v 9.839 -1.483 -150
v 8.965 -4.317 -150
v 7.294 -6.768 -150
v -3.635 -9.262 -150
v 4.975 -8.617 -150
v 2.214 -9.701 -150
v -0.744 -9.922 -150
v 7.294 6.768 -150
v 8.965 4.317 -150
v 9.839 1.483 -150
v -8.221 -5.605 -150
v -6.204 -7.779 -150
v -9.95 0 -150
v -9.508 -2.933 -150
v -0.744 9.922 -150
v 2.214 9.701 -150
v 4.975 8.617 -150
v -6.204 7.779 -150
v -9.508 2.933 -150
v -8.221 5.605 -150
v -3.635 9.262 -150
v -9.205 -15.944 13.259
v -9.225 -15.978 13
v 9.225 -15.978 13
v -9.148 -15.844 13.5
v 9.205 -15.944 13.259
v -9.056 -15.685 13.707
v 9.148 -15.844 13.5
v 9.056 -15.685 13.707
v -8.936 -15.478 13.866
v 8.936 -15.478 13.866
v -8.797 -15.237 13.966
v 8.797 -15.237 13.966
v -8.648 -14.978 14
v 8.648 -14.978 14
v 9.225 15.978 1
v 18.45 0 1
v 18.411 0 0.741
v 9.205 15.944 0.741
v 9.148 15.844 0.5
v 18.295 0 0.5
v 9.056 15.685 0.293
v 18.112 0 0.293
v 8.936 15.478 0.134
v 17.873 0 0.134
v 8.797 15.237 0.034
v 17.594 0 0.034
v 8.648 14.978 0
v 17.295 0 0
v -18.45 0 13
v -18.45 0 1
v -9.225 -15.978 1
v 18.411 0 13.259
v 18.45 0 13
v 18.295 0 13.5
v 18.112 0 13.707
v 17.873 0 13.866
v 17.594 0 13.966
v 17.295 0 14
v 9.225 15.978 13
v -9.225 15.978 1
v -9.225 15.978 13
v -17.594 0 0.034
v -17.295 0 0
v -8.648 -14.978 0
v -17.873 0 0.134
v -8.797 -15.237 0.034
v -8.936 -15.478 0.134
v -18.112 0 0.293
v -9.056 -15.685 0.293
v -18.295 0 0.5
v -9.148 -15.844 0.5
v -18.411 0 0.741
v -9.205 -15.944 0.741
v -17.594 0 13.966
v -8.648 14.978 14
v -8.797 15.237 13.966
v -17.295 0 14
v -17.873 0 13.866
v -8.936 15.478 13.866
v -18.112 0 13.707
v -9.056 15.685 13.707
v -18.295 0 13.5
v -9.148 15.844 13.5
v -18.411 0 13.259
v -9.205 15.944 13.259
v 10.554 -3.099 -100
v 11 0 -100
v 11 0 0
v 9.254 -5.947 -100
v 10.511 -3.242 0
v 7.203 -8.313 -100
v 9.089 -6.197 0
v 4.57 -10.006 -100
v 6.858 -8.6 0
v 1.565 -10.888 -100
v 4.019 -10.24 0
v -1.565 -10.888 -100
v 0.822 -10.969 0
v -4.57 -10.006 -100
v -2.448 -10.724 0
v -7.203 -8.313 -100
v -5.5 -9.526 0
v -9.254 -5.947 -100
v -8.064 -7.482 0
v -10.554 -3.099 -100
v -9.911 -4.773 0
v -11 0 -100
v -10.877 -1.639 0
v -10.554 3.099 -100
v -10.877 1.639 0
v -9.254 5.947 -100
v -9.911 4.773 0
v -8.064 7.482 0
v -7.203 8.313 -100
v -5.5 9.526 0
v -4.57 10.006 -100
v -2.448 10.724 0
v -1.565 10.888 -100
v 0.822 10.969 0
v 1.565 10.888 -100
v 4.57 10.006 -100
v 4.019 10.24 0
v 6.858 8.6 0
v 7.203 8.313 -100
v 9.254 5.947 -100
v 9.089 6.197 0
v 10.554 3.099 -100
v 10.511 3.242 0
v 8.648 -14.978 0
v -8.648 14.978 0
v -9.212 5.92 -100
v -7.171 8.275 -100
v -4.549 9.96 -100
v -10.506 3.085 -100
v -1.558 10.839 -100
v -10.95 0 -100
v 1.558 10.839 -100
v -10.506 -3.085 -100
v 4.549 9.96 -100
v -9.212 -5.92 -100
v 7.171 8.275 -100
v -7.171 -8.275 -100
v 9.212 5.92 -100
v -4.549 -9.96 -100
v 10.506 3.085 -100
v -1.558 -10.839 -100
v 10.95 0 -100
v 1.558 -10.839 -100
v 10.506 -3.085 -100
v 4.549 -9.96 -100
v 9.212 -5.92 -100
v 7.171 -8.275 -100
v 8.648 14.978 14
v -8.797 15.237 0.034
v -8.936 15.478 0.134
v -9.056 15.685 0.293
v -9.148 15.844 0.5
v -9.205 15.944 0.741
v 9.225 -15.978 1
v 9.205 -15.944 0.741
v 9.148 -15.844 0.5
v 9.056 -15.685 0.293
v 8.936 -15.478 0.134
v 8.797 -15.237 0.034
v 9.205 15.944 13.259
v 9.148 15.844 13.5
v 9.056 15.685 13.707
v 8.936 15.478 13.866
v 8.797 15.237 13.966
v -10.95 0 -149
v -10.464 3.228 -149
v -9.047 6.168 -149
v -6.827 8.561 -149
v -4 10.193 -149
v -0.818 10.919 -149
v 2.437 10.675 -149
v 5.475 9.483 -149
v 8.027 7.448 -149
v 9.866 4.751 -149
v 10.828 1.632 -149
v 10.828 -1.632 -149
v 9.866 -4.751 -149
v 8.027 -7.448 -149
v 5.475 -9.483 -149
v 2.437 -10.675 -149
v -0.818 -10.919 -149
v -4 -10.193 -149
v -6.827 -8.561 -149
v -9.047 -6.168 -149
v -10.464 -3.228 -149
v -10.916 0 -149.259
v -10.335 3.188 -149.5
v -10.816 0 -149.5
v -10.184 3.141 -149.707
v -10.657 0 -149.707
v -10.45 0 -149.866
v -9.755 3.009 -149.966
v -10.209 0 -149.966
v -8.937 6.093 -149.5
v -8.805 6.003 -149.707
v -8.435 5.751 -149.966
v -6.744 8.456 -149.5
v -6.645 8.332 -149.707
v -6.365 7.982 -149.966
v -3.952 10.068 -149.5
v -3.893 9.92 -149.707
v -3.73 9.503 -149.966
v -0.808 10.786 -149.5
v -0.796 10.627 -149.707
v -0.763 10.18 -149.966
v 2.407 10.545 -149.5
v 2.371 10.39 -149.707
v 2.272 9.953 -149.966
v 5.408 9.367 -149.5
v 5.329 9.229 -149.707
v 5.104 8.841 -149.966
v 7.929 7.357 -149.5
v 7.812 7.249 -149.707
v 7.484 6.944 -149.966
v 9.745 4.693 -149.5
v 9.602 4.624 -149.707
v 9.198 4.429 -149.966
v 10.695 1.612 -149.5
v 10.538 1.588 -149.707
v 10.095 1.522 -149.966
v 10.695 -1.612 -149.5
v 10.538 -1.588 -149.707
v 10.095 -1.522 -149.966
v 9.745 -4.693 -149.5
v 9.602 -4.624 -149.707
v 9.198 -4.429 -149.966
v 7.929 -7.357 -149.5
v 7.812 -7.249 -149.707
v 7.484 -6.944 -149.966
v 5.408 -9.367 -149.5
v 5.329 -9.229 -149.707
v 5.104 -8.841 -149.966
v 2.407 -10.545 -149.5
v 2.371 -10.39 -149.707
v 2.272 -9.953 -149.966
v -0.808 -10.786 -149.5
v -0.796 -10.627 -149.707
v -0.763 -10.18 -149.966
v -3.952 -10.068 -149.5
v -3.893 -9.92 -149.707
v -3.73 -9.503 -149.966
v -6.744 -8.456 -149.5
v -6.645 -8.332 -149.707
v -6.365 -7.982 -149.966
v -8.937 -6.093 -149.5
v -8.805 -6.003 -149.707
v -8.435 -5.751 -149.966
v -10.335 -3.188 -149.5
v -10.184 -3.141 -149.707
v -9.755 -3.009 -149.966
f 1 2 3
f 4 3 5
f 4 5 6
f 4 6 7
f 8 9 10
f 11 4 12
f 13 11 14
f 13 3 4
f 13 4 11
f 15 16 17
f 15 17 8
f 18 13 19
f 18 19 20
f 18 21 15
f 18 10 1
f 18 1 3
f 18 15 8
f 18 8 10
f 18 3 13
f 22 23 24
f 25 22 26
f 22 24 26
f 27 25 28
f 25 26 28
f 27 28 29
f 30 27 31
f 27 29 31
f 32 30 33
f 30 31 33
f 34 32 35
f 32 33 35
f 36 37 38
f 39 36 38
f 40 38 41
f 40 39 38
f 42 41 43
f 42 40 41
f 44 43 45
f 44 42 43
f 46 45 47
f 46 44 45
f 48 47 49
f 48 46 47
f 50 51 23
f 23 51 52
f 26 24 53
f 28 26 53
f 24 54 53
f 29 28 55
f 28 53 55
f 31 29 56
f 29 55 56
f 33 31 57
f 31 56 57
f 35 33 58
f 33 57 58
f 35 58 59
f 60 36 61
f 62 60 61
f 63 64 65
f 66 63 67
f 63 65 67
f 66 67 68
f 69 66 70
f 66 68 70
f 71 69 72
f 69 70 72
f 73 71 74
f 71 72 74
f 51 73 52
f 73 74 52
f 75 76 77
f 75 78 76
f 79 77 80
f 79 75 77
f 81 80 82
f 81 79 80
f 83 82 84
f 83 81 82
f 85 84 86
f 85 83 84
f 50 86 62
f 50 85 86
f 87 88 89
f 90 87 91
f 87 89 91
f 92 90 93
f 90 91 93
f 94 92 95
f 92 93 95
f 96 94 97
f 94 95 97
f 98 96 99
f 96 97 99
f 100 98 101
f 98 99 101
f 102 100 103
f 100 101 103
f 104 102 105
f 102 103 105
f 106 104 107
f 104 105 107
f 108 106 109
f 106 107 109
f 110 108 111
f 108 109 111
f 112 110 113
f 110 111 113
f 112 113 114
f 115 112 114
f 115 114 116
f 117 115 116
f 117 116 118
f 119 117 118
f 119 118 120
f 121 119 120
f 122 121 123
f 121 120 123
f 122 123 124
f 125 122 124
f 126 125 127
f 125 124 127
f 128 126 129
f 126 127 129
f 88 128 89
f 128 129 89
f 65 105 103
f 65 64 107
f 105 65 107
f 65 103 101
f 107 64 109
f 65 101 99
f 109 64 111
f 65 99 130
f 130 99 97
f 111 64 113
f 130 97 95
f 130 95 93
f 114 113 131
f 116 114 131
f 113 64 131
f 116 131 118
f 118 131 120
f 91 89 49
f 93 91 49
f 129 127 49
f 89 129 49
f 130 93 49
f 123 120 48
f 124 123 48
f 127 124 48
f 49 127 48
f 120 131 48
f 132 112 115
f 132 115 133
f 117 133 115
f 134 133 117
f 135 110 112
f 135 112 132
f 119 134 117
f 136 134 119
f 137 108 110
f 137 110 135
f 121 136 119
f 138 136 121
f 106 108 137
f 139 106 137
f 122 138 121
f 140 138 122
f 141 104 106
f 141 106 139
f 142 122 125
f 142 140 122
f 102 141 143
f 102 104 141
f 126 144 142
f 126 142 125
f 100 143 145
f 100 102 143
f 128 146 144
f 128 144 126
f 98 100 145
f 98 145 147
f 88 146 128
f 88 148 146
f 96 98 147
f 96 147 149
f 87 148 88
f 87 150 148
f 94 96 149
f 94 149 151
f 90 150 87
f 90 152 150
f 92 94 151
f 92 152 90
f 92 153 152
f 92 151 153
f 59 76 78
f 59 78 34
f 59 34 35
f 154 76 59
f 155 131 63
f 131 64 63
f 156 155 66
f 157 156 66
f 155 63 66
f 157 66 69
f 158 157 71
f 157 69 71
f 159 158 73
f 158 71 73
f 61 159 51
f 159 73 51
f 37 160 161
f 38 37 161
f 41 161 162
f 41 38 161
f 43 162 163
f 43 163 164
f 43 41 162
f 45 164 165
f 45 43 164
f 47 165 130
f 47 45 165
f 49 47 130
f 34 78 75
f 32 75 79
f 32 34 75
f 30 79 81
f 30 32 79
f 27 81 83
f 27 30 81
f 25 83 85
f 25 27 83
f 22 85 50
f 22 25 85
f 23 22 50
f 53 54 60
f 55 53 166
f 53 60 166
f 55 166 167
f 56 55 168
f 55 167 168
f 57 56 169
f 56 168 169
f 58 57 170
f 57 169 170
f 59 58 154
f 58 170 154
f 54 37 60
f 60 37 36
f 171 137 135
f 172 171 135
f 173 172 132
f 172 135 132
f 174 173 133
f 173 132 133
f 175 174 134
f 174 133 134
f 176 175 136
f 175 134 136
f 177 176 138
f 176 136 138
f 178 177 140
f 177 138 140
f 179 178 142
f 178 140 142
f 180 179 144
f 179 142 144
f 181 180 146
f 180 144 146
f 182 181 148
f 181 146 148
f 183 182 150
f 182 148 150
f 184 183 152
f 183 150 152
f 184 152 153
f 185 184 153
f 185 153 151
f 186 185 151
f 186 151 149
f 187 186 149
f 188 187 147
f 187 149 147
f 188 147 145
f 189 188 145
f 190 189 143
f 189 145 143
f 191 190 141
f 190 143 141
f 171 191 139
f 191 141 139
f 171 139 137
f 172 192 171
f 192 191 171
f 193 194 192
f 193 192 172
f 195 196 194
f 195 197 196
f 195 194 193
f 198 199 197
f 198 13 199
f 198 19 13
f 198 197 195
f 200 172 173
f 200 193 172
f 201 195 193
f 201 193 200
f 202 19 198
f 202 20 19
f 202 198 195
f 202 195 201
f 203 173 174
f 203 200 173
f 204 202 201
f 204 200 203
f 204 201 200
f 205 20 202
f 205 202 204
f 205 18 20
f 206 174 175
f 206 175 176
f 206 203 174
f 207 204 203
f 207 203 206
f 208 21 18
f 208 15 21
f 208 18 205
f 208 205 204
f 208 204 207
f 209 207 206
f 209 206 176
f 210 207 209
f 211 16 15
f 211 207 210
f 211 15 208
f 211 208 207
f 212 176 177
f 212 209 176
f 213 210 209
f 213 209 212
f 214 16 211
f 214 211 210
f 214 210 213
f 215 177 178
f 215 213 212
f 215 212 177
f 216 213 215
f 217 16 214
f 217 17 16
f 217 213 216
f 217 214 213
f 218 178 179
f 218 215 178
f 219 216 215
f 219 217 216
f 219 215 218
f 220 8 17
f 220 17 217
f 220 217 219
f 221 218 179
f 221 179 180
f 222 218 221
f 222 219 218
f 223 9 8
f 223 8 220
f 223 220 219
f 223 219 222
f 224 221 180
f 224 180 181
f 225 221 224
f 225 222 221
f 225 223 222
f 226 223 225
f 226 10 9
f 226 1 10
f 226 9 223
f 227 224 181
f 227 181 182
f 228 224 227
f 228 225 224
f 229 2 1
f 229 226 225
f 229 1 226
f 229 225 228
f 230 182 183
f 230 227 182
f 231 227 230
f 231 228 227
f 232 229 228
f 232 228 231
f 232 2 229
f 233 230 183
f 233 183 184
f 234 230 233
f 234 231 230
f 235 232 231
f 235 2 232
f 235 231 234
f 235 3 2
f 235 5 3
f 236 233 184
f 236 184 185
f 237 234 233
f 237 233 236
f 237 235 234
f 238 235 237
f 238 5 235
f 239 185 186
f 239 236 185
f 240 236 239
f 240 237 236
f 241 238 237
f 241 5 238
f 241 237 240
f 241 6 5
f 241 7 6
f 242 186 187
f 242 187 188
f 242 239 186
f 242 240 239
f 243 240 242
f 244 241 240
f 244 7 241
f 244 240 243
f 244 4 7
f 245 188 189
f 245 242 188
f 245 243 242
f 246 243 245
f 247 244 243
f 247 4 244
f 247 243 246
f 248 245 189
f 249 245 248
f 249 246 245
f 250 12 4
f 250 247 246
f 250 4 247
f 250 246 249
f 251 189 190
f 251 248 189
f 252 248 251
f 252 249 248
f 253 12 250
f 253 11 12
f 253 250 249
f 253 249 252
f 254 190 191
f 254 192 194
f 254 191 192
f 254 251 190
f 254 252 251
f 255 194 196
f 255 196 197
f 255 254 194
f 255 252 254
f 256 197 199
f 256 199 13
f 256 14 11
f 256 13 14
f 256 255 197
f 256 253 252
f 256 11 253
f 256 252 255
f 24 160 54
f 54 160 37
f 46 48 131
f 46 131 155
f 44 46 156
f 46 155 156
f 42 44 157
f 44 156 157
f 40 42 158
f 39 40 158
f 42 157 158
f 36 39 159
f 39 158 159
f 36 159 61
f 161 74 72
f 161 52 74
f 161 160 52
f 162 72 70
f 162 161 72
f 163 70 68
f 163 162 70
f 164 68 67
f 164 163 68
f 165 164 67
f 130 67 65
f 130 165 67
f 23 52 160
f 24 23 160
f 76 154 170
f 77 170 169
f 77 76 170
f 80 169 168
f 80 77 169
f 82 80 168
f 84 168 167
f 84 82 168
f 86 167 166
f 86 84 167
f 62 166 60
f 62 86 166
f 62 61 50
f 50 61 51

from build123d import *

# Parameters (mm, degrees)
EXTRUDE_1_DEPTH = 14
SKETCH_3_R      = 11
EXTRUDE_2_DEPTH = 100
SKETCH_4_R      = 10.95
EXTRUDE_4_DEPTH = 50
FILLET_2_R      = 1


with BuildPart() as part:
    # 草图2 → 拉伸1 (new body)
    with BuildSketch(Plane.XY):
        Polygon((9.225, -15.9781687), (18.45, 0), (9.225, 15.9781687), (-9.225, 15.9781687), (-18.45, 0), (-9.225, -15.9781687), align=None)
    extrude(amount=EXTRUDE_1_DEPTH)

    # 草图3 → 拉伸2 (add)
    with BuildSketch(Plane(origin=(0, 0, 0), x_dir=(-1, 0, 0), z_dir=(0, 0, -1))):
        with Locations(Location((0, 0, 0), (0, 0, 180))):
            Circle(SKETCH_3_R)
    extrude(amount=EXTRUDE_2_DEPTH)

    # 草图4 → 拉伸4 (add)
    with BuildSketch(Plane(origin=(0, 0, -100), x_dir=(-1, 0, 0), z_dir=(0, 0, -1))):
        Circle(SKETCH_4_R)
    extrude(amount=EXTRUDE_4_DEPTH)

    # 圆角2
    fillet_2_edges = [part.edges().sort_by_distance(p)[0] for p in [
        (13.8375, 7.98908435, 14),
        (0, 15.9781687, 14),
        (-13.8375, 7.98908435, 14),
        (-13.8375, -7.98908435, 14),
        (10.95, 0, -150),
        (0, -15.9781687, 14),
        (-13.8375, -7.98908435, 0),
        (-13.8375, 7.98908435, 0),
        (0, 15.9781687, 0),
        (13.8375, -7.98908435, 14),
        (13.8375, 7.98908435, 0),
        (13.8375, -7.98908435, 0),
        (0, -15.9781687, 0),
    ]]
    fillet(fillet_2_edges, radius=FILLET_2_R)


solid = part.part
